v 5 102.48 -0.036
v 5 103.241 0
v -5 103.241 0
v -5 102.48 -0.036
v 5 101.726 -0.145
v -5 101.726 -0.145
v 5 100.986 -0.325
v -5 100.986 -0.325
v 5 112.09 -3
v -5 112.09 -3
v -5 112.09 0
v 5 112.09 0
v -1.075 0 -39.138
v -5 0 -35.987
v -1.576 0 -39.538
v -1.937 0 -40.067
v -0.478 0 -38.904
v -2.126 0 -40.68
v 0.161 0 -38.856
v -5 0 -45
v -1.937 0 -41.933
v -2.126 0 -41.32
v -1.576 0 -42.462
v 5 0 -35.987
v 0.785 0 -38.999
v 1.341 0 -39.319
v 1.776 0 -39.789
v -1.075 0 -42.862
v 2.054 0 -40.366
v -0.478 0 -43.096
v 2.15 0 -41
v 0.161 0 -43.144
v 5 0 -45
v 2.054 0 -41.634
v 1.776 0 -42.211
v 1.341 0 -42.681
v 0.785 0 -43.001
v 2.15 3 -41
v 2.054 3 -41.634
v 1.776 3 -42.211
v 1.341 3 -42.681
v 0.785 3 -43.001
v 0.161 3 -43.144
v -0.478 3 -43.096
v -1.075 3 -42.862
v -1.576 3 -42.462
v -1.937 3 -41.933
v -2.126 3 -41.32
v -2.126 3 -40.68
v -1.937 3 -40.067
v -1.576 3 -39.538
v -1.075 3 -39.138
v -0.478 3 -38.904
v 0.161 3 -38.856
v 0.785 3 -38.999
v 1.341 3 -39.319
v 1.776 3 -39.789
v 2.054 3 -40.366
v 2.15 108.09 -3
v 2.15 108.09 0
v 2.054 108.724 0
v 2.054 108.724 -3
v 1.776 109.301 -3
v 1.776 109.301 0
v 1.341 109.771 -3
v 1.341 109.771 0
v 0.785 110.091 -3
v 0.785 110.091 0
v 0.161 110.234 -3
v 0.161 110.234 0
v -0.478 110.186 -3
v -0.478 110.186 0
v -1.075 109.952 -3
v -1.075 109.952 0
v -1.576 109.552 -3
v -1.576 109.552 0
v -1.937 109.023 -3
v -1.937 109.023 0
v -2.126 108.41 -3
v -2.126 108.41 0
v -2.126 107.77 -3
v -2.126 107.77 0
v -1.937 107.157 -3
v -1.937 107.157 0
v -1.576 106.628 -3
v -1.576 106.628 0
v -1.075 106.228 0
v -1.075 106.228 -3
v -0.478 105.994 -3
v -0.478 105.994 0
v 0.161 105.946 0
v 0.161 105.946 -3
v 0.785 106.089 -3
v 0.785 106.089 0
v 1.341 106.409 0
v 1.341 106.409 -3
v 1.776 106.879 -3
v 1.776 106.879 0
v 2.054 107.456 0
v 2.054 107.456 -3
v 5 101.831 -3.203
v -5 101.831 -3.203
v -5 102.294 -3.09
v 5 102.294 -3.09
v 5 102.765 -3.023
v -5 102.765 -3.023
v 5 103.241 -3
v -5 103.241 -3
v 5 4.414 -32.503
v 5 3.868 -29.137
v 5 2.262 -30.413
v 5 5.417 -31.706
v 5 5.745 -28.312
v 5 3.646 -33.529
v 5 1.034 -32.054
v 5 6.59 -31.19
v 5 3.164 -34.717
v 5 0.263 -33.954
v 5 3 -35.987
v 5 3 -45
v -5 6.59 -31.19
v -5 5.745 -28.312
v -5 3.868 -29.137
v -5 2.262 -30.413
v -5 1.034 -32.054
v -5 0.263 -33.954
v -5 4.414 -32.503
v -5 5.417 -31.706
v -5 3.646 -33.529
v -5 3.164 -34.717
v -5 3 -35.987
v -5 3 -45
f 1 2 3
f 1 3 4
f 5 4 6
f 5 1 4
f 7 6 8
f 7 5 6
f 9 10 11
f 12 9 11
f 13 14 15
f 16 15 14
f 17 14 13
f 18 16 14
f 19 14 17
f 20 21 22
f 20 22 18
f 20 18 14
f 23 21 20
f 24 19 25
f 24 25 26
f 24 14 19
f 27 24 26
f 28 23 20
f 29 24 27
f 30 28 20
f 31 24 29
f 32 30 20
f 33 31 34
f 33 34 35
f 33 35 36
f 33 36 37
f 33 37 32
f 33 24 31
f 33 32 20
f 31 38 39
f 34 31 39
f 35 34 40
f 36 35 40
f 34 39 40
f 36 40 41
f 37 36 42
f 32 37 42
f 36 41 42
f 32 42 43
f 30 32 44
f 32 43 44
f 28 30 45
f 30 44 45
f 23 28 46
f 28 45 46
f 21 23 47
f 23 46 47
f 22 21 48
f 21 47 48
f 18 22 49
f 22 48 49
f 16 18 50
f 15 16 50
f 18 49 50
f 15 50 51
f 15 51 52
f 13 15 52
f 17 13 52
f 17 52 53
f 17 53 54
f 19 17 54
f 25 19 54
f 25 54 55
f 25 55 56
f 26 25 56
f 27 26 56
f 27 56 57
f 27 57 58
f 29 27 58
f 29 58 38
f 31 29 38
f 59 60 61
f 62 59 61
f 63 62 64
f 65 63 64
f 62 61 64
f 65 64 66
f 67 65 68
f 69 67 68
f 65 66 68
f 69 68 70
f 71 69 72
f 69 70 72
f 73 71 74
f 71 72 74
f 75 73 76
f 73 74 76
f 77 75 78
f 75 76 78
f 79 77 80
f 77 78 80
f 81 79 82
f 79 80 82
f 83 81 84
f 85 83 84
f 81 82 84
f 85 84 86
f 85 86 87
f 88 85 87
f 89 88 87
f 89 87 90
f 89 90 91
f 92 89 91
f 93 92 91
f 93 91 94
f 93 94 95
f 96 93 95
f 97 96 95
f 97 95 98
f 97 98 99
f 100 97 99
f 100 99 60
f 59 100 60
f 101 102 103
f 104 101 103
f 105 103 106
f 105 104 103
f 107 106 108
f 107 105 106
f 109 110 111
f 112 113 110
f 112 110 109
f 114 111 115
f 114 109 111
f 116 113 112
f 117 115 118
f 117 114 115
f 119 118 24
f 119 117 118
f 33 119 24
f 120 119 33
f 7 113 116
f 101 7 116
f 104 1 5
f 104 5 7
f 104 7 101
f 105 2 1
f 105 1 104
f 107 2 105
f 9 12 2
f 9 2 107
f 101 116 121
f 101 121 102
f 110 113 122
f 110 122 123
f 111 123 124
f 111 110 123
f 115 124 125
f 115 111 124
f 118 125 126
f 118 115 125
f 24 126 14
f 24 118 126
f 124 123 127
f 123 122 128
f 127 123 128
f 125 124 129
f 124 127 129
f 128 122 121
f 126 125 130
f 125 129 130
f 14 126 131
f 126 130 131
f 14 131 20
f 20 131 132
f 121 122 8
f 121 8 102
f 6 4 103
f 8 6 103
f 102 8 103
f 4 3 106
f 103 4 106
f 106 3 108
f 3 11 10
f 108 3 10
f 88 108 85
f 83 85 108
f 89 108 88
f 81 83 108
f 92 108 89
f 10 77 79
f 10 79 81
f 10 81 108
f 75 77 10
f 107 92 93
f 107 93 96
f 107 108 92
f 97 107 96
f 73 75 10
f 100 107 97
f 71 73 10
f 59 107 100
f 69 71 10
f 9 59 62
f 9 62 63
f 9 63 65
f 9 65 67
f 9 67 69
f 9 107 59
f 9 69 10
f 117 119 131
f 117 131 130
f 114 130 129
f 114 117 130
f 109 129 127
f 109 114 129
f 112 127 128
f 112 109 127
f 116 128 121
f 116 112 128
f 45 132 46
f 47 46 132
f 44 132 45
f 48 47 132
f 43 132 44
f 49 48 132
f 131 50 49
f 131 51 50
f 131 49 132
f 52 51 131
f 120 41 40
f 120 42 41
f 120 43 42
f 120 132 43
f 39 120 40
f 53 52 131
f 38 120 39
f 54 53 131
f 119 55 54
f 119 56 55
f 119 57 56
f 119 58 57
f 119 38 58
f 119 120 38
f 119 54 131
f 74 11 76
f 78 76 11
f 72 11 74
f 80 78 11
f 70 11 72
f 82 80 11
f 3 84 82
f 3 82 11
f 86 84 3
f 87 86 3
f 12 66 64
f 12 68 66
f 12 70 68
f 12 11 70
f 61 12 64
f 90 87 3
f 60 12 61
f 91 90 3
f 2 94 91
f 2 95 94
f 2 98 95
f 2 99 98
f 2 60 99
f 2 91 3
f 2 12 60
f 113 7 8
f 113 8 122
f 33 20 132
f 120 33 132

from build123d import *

# Parameters (mm, degrees)
EXTRUDE_1_DEPTH    = 5
HOLE_WIZARD_M4_1_D = 4.3
HOLE_WIZARD_M4_2_D = 4.3


with BuildPart() as part:
    # 草图1 → 拉伸-薄壁1 (new, symmetric)
    with BuildSketch(Plane(origin=(0, 0, 0), x_dir=(0, 0, -1), z_dir=(1, 0, 0))):
        with BuildLine():
            Line((0, 112.09), (0, 103.241097815))
            ThreePointArc((0, 103.241097815), (0.081550018, 102.101734006), (0.324537472, 100.985598982))
            Line((0.324537472, 100.985598982), (28.311930306, 5.744501167))
            ThreePointArc((28.311930306, 5.744501167), (31.193855031, 1.595158446), (35.987392834, 0))
            Line((35.987392834, 0), (45, 0))
            Line((45, 0), (45, 3))
            Line((45, 3), (35.987392834, 3))
            ThreePointArc((35.987392834, 3), (32.991431707, 3.996974029), (31.190228754, 6.59031323))
            Line((31.190228754, 6.59031323), (3.20283592, 101.831411044))
            ThreePointArc((3.20283592, 101.831411044), (3.050968761, 102.528995434), (3, 103.241097815))
            Line((3, 103.241097815), (3, 112.09))
            Line((3, 112.09), (0, 112.09))
        make_face()
    extrude(amount=EXTRUDE_1_DEPTH, both=True)

    # M4 间隙孔1 (through all)
    with Locations(Plane(origin=(0, 0, -3), x_dir=(-1, 0, 0), z_dir=(0, 0, -1))):
        with Locations((0, 108.09)):
            Hole(HOLE_WIZARD_M4_1_D / 2)

    # M4 间隙孔2 (through all)
    with Locations(Plane(origin=(0, 0, 0), x_dir=(-1, 0, 0), z_dir=(0, -1, 0))):
        with Locations((0, 41)):
            Hole(HOLE_WIZARD_M4_2_D / 2)


solid = part.part
